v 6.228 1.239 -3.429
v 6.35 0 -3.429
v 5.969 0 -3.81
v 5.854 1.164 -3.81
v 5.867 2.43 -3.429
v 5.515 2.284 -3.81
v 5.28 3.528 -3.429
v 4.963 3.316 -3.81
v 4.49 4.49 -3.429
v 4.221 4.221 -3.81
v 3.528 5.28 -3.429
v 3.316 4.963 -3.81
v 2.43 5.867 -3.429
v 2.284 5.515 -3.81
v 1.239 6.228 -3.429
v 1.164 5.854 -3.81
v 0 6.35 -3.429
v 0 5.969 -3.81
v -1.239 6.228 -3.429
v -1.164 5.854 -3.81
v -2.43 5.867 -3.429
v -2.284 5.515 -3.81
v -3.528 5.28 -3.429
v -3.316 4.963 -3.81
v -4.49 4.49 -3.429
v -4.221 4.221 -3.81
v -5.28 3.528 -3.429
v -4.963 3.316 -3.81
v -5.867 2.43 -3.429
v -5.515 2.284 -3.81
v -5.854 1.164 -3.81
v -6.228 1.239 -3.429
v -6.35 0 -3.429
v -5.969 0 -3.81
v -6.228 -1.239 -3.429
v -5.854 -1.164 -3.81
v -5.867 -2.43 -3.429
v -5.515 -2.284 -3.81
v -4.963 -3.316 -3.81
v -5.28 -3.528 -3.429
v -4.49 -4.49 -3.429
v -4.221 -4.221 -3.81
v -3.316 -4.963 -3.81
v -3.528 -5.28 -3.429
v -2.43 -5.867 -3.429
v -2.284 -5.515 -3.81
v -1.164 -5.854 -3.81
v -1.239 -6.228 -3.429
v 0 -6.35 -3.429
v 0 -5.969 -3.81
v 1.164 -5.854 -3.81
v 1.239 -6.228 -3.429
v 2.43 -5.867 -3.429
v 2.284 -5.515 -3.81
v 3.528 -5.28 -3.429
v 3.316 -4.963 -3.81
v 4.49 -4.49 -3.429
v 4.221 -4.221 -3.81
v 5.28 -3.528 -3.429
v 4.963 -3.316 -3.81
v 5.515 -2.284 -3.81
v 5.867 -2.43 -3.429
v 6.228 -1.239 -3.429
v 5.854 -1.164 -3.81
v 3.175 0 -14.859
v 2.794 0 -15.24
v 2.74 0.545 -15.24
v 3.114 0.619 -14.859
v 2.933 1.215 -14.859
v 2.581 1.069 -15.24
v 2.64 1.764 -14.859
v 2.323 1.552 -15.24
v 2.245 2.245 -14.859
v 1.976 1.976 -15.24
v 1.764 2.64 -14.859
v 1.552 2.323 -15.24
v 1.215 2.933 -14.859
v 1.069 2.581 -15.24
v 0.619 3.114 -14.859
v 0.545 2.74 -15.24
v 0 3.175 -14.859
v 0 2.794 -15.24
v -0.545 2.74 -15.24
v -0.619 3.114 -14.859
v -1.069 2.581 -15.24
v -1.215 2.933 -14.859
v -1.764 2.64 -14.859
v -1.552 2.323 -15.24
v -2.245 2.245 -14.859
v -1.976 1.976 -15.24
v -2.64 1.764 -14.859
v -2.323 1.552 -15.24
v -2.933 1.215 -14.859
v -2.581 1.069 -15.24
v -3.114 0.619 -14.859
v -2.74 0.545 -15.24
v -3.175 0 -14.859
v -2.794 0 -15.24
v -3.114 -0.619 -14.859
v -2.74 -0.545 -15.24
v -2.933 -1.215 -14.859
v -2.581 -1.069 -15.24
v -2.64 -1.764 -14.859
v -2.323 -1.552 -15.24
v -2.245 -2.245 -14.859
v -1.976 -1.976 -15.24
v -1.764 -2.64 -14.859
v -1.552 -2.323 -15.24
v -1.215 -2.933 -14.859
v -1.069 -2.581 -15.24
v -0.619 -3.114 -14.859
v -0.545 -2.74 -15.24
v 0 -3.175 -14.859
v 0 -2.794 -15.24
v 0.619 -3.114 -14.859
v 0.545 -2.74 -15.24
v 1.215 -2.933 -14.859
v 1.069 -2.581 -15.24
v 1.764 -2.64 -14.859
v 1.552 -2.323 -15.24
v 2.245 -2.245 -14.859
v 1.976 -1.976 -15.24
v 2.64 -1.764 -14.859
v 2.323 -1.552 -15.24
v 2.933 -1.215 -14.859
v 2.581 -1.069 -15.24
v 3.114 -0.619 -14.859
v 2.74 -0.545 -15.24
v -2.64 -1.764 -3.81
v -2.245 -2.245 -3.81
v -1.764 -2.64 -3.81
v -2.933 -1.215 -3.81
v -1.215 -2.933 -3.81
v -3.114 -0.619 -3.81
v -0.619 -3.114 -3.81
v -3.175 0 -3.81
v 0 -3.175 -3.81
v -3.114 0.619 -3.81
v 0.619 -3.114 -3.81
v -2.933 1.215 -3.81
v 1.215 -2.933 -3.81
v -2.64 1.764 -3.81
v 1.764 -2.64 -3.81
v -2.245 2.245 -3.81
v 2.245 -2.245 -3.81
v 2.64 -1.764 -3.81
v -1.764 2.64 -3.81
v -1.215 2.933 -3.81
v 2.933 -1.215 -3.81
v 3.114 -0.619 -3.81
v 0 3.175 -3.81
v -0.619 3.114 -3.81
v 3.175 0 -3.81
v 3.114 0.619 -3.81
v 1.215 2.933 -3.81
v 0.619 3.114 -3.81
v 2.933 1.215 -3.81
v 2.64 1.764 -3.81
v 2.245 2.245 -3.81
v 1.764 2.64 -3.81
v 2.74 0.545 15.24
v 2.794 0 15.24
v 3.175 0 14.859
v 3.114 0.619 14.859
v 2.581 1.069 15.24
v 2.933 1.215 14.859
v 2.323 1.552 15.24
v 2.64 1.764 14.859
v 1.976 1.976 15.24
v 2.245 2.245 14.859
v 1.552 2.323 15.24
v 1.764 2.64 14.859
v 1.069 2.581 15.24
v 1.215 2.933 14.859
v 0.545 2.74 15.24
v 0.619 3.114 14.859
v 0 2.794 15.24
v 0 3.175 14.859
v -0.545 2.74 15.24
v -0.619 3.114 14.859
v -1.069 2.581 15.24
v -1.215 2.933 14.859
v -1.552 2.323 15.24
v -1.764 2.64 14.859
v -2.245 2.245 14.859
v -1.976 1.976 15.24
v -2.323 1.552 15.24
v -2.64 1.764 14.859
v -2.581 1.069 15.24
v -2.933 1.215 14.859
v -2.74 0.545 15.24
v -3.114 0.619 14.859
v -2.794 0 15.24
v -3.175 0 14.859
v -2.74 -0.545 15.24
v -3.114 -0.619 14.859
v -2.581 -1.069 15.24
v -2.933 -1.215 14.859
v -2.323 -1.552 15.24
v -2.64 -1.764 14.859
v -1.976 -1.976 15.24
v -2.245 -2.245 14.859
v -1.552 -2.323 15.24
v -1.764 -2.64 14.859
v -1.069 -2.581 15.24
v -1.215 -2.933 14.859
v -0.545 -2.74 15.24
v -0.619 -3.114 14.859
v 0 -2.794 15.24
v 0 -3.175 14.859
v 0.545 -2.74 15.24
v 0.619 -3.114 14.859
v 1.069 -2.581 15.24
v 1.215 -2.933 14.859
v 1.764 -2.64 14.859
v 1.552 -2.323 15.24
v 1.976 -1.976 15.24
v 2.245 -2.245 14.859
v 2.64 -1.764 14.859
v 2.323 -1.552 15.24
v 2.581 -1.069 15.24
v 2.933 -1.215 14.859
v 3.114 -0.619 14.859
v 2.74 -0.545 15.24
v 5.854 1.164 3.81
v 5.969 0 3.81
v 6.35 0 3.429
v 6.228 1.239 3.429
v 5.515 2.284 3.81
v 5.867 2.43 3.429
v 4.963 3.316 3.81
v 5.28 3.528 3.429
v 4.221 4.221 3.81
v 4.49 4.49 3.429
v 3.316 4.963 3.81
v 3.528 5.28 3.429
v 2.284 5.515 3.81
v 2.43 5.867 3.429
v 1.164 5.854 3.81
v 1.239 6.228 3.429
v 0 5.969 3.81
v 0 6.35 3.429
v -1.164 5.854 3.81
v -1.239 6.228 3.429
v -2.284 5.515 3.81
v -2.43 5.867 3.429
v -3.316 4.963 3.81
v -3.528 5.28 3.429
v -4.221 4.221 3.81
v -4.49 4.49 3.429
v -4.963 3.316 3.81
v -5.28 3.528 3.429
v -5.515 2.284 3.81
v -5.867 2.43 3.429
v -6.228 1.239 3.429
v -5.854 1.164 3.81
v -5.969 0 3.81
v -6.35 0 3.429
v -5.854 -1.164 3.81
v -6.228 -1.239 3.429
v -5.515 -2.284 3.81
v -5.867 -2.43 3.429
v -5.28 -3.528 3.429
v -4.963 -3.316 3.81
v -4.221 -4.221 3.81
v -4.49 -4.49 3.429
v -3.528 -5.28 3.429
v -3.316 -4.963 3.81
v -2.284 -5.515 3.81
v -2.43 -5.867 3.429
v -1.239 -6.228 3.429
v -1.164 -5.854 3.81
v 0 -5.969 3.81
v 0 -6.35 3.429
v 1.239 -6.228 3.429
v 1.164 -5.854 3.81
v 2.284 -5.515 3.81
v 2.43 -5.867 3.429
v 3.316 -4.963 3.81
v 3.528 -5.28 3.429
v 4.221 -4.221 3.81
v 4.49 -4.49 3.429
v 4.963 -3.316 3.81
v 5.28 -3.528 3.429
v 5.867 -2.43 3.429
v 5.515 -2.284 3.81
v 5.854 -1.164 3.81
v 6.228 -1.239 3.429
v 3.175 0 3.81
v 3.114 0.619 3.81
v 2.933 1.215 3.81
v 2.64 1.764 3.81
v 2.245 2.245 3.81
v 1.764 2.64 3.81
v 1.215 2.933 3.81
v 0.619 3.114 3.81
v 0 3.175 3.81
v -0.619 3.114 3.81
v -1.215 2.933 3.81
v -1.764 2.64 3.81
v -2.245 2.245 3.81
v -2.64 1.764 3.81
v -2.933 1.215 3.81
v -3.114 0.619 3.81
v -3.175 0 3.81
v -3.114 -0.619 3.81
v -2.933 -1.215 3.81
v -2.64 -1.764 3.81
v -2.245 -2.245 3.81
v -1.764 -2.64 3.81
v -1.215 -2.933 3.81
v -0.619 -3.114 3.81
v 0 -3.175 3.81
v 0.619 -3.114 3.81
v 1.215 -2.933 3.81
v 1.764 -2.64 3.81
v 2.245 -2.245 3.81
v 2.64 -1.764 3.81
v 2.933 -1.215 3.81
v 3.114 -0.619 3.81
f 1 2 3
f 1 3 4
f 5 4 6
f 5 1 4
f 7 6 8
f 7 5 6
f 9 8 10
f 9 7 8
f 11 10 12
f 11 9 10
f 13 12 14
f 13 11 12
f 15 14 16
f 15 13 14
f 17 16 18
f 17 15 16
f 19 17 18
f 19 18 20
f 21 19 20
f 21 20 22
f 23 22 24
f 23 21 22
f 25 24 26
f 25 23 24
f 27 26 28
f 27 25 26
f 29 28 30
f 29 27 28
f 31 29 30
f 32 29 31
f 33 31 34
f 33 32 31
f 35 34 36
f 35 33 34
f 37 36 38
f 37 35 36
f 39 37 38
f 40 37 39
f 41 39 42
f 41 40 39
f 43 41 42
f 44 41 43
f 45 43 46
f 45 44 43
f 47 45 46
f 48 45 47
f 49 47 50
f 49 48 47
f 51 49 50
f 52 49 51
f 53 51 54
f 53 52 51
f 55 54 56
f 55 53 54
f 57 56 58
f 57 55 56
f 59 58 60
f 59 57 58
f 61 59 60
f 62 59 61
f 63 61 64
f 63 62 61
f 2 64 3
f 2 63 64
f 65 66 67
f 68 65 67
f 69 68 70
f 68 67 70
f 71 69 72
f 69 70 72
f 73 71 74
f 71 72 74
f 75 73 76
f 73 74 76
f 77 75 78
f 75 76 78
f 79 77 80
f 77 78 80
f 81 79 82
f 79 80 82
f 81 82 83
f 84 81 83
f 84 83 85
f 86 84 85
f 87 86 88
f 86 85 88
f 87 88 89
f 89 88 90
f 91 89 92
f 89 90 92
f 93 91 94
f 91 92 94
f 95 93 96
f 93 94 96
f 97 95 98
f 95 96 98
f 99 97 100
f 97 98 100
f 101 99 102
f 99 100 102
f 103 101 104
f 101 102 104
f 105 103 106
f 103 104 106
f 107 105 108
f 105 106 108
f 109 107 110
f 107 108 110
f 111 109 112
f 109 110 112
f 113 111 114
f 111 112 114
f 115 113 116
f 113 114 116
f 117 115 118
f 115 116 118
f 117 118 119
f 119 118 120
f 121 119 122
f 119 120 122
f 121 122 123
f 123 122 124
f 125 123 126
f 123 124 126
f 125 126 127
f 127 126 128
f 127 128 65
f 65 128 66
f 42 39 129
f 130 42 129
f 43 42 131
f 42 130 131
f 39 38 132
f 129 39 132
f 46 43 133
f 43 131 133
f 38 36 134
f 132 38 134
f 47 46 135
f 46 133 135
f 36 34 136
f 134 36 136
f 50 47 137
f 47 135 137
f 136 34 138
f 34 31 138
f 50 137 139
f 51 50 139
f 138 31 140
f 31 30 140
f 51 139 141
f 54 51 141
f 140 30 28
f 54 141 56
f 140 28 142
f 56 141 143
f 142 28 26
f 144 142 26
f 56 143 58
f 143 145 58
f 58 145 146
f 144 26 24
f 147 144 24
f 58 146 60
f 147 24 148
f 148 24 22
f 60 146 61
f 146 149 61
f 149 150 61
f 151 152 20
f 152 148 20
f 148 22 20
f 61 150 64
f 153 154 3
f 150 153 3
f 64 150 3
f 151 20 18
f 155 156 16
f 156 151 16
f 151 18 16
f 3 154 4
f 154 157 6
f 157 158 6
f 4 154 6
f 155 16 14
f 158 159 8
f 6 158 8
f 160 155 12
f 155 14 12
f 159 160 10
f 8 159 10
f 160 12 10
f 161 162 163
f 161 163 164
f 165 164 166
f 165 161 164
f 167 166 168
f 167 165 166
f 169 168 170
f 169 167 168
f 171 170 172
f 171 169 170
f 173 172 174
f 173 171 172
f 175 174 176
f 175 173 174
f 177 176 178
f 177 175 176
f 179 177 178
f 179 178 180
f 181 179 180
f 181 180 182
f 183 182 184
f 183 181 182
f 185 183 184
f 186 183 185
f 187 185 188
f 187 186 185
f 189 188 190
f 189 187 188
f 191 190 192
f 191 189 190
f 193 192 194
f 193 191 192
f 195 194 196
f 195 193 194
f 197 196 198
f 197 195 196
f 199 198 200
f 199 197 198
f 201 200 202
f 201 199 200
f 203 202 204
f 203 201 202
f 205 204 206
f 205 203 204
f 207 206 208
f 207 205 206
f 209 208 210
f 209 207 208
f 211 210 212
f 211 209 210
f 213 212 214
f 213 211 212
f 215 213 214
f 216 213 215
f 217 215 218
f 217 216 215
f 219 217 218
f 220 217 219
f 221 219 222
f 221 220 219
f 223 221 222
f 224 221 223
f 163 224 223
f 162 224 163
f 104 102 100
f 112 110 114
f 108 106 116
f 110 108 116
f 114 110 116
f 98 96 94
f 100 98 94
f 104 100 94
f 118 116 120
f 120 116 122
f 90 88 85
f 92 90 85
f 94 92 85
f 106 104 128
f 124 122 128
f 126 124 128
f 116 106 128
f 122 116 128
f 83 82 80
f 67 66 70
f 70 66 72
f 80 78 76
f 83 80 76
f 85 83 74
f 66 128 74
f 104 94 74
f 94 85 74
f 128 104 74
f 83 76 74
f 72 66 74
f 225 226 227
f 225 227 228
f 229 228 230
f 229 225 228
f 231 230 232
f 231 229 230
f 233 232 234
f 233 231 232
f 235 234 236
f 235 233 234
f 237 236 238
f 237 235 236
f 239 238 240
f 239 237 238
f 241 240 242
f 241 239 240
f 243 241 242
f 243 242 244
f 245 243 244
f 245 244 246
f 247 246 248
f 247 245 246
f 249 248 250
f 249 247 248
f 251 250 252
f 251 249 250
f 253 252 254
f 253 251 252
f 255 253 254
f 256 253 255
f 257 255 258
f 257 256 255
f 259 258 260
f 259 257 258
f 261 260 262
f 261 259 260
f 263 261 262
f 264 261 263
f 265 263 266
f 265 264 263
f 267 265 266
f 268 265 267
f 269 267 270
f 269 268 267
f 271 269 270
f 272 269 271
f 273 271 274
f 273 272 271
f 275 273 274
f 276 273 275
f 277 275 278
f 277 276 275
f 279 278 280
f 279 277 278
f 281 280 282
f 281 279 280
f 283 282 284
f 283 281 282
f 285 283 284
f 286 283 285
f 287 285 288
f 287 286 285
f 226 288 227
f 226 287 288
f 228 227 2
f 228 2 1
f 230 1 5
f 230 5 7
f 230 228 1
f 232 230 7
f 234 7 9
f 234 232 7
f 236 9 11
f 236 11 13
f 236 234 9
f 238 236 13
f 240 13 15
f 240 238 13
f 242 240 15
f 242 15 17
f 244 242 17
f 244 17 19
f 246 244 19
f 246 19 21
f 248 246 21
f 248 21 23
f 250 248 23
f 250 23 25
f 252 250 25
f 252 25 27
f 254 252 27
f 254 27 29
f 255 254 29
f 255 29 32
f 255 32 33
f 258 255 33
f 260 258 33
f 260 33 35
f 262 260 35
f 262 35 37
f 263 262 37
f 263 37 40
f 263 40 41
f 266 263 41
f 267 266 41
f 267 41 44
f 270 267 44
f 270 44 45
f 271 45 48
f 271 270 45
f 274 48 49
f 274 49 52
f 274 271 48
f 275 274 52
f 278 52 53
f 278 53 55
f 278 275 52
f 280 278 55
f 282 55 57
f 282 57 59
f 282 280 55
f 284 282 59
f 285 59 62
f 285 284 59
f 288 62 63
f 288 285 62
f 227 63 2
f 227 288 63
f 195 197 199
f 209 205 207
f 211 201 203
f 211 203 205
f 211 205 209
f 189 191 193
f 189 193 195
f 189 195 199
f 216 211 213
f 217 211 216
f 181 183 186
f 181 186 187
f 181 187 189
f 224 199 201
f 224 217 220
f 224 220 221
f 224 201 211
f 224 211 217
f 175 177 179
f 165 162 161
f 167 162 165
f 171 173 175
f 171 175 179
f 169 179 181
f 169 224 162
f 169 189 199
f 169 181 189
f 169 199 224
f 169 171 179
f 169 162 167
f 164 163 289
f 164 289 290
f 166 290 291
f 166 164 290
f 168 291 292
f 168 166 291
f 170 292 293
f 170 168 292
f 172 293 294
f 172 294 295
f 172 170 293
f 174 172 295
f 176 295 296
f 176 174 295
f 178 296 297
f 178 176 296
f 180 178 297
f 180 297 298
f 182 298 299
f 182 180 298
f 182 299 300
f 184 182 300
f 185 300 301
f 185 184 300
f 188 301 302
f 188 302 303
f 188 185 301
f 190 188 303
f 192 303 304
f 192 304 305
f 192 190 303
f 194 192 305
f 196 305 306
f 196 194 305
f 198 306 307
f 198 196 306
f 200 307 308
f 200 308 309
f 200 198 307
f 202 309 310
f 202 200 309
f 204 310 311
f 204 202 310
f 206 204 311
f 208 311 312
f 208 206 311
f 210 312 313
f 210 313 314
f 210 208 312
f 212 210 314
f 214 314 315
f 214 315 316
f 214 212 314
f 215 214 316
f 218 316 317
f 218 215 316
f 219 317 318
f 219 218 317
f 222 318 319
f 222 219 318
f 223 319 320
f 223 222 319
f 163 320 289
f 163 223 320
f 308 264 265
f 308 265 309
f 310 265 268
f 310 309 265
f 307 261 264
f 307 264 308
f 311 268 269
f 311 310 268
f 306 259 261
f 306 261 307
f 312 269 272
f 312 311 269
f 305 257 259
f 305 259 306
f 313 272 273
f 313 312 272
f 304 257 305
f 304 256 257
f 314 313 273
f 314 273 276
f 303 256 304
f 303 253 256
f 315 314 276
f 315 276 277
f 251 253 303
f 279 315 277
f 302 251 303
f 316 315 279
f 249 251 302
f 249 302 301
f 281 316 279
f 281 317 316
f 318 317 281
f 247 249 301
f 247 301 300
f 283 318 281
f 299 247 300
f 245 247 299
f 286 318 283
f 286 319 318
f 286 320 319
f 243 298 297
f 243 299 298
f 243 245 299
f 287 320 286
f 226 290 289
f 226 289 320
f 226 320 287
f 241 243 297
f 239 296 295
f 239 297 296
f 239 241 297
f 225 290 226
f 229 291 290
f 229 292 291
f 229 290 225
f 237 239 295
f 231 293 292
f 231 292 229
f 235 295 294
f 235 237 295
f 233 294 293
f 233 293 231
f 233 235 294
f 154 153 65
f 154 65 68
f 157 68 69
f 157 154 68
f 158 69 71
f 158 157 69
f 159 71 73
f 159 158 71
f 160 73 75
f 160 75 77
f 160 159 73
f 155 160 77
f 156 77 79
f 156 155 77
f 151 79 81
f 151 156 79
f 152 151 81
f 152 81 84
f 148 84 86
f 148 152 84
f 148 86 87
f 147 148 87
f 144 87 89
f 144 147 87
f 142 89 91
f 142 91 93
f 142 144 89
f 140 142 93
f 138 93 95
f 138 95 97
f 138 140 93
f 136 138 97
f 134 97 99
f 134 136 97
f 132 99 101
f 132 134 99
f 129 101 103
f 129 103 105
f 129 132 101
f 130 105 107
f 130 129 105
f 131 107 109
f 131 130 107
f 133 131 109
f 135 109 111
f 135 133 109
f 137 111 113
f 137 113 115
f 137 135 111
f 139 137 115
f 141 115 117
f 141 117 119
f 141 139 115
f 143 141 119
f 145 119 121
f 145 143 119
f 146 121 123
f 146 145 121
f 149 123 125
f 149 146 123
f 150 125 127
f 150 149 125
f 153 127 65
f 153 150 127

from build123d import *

# Parameters (mm, degrees)
F0_R     = 3.175
F1_DEPTH = 15.24
F0_R_2   = 6.35
F2_DEPTH = 3.81
F3_SIZE  = 0.381


with BuildPart() as f1:
    # F0 (on Top) → F1 (new body, symmetric)
    with BuildSketch(Plane.XY):
        Circle(F0_R)
    extrude(amount=F1_DEPTH, both=True)

    # F0 (on Top) → F2 (join, symmetric)
    with BuildSketch(Plane.XY):
        Circle(F0_R_2)
        Circle(F0_R, mode=Mode.SUBTRACT)
    extrude(amount=F2_DEPTH, both=True)

    # F3
    f3_edges = [f1.edges().sort_by_distance(p)[0] for p in [
        (-6.35, 0, 3.81),
        (-6.35, 0, -3.81),
        (-3.175, 0, 15.24),
        (-3.175, 0, -15.24),
    ]]
    chamfer(f3_edges, length=F3_SIZE)


solid = f1.part
